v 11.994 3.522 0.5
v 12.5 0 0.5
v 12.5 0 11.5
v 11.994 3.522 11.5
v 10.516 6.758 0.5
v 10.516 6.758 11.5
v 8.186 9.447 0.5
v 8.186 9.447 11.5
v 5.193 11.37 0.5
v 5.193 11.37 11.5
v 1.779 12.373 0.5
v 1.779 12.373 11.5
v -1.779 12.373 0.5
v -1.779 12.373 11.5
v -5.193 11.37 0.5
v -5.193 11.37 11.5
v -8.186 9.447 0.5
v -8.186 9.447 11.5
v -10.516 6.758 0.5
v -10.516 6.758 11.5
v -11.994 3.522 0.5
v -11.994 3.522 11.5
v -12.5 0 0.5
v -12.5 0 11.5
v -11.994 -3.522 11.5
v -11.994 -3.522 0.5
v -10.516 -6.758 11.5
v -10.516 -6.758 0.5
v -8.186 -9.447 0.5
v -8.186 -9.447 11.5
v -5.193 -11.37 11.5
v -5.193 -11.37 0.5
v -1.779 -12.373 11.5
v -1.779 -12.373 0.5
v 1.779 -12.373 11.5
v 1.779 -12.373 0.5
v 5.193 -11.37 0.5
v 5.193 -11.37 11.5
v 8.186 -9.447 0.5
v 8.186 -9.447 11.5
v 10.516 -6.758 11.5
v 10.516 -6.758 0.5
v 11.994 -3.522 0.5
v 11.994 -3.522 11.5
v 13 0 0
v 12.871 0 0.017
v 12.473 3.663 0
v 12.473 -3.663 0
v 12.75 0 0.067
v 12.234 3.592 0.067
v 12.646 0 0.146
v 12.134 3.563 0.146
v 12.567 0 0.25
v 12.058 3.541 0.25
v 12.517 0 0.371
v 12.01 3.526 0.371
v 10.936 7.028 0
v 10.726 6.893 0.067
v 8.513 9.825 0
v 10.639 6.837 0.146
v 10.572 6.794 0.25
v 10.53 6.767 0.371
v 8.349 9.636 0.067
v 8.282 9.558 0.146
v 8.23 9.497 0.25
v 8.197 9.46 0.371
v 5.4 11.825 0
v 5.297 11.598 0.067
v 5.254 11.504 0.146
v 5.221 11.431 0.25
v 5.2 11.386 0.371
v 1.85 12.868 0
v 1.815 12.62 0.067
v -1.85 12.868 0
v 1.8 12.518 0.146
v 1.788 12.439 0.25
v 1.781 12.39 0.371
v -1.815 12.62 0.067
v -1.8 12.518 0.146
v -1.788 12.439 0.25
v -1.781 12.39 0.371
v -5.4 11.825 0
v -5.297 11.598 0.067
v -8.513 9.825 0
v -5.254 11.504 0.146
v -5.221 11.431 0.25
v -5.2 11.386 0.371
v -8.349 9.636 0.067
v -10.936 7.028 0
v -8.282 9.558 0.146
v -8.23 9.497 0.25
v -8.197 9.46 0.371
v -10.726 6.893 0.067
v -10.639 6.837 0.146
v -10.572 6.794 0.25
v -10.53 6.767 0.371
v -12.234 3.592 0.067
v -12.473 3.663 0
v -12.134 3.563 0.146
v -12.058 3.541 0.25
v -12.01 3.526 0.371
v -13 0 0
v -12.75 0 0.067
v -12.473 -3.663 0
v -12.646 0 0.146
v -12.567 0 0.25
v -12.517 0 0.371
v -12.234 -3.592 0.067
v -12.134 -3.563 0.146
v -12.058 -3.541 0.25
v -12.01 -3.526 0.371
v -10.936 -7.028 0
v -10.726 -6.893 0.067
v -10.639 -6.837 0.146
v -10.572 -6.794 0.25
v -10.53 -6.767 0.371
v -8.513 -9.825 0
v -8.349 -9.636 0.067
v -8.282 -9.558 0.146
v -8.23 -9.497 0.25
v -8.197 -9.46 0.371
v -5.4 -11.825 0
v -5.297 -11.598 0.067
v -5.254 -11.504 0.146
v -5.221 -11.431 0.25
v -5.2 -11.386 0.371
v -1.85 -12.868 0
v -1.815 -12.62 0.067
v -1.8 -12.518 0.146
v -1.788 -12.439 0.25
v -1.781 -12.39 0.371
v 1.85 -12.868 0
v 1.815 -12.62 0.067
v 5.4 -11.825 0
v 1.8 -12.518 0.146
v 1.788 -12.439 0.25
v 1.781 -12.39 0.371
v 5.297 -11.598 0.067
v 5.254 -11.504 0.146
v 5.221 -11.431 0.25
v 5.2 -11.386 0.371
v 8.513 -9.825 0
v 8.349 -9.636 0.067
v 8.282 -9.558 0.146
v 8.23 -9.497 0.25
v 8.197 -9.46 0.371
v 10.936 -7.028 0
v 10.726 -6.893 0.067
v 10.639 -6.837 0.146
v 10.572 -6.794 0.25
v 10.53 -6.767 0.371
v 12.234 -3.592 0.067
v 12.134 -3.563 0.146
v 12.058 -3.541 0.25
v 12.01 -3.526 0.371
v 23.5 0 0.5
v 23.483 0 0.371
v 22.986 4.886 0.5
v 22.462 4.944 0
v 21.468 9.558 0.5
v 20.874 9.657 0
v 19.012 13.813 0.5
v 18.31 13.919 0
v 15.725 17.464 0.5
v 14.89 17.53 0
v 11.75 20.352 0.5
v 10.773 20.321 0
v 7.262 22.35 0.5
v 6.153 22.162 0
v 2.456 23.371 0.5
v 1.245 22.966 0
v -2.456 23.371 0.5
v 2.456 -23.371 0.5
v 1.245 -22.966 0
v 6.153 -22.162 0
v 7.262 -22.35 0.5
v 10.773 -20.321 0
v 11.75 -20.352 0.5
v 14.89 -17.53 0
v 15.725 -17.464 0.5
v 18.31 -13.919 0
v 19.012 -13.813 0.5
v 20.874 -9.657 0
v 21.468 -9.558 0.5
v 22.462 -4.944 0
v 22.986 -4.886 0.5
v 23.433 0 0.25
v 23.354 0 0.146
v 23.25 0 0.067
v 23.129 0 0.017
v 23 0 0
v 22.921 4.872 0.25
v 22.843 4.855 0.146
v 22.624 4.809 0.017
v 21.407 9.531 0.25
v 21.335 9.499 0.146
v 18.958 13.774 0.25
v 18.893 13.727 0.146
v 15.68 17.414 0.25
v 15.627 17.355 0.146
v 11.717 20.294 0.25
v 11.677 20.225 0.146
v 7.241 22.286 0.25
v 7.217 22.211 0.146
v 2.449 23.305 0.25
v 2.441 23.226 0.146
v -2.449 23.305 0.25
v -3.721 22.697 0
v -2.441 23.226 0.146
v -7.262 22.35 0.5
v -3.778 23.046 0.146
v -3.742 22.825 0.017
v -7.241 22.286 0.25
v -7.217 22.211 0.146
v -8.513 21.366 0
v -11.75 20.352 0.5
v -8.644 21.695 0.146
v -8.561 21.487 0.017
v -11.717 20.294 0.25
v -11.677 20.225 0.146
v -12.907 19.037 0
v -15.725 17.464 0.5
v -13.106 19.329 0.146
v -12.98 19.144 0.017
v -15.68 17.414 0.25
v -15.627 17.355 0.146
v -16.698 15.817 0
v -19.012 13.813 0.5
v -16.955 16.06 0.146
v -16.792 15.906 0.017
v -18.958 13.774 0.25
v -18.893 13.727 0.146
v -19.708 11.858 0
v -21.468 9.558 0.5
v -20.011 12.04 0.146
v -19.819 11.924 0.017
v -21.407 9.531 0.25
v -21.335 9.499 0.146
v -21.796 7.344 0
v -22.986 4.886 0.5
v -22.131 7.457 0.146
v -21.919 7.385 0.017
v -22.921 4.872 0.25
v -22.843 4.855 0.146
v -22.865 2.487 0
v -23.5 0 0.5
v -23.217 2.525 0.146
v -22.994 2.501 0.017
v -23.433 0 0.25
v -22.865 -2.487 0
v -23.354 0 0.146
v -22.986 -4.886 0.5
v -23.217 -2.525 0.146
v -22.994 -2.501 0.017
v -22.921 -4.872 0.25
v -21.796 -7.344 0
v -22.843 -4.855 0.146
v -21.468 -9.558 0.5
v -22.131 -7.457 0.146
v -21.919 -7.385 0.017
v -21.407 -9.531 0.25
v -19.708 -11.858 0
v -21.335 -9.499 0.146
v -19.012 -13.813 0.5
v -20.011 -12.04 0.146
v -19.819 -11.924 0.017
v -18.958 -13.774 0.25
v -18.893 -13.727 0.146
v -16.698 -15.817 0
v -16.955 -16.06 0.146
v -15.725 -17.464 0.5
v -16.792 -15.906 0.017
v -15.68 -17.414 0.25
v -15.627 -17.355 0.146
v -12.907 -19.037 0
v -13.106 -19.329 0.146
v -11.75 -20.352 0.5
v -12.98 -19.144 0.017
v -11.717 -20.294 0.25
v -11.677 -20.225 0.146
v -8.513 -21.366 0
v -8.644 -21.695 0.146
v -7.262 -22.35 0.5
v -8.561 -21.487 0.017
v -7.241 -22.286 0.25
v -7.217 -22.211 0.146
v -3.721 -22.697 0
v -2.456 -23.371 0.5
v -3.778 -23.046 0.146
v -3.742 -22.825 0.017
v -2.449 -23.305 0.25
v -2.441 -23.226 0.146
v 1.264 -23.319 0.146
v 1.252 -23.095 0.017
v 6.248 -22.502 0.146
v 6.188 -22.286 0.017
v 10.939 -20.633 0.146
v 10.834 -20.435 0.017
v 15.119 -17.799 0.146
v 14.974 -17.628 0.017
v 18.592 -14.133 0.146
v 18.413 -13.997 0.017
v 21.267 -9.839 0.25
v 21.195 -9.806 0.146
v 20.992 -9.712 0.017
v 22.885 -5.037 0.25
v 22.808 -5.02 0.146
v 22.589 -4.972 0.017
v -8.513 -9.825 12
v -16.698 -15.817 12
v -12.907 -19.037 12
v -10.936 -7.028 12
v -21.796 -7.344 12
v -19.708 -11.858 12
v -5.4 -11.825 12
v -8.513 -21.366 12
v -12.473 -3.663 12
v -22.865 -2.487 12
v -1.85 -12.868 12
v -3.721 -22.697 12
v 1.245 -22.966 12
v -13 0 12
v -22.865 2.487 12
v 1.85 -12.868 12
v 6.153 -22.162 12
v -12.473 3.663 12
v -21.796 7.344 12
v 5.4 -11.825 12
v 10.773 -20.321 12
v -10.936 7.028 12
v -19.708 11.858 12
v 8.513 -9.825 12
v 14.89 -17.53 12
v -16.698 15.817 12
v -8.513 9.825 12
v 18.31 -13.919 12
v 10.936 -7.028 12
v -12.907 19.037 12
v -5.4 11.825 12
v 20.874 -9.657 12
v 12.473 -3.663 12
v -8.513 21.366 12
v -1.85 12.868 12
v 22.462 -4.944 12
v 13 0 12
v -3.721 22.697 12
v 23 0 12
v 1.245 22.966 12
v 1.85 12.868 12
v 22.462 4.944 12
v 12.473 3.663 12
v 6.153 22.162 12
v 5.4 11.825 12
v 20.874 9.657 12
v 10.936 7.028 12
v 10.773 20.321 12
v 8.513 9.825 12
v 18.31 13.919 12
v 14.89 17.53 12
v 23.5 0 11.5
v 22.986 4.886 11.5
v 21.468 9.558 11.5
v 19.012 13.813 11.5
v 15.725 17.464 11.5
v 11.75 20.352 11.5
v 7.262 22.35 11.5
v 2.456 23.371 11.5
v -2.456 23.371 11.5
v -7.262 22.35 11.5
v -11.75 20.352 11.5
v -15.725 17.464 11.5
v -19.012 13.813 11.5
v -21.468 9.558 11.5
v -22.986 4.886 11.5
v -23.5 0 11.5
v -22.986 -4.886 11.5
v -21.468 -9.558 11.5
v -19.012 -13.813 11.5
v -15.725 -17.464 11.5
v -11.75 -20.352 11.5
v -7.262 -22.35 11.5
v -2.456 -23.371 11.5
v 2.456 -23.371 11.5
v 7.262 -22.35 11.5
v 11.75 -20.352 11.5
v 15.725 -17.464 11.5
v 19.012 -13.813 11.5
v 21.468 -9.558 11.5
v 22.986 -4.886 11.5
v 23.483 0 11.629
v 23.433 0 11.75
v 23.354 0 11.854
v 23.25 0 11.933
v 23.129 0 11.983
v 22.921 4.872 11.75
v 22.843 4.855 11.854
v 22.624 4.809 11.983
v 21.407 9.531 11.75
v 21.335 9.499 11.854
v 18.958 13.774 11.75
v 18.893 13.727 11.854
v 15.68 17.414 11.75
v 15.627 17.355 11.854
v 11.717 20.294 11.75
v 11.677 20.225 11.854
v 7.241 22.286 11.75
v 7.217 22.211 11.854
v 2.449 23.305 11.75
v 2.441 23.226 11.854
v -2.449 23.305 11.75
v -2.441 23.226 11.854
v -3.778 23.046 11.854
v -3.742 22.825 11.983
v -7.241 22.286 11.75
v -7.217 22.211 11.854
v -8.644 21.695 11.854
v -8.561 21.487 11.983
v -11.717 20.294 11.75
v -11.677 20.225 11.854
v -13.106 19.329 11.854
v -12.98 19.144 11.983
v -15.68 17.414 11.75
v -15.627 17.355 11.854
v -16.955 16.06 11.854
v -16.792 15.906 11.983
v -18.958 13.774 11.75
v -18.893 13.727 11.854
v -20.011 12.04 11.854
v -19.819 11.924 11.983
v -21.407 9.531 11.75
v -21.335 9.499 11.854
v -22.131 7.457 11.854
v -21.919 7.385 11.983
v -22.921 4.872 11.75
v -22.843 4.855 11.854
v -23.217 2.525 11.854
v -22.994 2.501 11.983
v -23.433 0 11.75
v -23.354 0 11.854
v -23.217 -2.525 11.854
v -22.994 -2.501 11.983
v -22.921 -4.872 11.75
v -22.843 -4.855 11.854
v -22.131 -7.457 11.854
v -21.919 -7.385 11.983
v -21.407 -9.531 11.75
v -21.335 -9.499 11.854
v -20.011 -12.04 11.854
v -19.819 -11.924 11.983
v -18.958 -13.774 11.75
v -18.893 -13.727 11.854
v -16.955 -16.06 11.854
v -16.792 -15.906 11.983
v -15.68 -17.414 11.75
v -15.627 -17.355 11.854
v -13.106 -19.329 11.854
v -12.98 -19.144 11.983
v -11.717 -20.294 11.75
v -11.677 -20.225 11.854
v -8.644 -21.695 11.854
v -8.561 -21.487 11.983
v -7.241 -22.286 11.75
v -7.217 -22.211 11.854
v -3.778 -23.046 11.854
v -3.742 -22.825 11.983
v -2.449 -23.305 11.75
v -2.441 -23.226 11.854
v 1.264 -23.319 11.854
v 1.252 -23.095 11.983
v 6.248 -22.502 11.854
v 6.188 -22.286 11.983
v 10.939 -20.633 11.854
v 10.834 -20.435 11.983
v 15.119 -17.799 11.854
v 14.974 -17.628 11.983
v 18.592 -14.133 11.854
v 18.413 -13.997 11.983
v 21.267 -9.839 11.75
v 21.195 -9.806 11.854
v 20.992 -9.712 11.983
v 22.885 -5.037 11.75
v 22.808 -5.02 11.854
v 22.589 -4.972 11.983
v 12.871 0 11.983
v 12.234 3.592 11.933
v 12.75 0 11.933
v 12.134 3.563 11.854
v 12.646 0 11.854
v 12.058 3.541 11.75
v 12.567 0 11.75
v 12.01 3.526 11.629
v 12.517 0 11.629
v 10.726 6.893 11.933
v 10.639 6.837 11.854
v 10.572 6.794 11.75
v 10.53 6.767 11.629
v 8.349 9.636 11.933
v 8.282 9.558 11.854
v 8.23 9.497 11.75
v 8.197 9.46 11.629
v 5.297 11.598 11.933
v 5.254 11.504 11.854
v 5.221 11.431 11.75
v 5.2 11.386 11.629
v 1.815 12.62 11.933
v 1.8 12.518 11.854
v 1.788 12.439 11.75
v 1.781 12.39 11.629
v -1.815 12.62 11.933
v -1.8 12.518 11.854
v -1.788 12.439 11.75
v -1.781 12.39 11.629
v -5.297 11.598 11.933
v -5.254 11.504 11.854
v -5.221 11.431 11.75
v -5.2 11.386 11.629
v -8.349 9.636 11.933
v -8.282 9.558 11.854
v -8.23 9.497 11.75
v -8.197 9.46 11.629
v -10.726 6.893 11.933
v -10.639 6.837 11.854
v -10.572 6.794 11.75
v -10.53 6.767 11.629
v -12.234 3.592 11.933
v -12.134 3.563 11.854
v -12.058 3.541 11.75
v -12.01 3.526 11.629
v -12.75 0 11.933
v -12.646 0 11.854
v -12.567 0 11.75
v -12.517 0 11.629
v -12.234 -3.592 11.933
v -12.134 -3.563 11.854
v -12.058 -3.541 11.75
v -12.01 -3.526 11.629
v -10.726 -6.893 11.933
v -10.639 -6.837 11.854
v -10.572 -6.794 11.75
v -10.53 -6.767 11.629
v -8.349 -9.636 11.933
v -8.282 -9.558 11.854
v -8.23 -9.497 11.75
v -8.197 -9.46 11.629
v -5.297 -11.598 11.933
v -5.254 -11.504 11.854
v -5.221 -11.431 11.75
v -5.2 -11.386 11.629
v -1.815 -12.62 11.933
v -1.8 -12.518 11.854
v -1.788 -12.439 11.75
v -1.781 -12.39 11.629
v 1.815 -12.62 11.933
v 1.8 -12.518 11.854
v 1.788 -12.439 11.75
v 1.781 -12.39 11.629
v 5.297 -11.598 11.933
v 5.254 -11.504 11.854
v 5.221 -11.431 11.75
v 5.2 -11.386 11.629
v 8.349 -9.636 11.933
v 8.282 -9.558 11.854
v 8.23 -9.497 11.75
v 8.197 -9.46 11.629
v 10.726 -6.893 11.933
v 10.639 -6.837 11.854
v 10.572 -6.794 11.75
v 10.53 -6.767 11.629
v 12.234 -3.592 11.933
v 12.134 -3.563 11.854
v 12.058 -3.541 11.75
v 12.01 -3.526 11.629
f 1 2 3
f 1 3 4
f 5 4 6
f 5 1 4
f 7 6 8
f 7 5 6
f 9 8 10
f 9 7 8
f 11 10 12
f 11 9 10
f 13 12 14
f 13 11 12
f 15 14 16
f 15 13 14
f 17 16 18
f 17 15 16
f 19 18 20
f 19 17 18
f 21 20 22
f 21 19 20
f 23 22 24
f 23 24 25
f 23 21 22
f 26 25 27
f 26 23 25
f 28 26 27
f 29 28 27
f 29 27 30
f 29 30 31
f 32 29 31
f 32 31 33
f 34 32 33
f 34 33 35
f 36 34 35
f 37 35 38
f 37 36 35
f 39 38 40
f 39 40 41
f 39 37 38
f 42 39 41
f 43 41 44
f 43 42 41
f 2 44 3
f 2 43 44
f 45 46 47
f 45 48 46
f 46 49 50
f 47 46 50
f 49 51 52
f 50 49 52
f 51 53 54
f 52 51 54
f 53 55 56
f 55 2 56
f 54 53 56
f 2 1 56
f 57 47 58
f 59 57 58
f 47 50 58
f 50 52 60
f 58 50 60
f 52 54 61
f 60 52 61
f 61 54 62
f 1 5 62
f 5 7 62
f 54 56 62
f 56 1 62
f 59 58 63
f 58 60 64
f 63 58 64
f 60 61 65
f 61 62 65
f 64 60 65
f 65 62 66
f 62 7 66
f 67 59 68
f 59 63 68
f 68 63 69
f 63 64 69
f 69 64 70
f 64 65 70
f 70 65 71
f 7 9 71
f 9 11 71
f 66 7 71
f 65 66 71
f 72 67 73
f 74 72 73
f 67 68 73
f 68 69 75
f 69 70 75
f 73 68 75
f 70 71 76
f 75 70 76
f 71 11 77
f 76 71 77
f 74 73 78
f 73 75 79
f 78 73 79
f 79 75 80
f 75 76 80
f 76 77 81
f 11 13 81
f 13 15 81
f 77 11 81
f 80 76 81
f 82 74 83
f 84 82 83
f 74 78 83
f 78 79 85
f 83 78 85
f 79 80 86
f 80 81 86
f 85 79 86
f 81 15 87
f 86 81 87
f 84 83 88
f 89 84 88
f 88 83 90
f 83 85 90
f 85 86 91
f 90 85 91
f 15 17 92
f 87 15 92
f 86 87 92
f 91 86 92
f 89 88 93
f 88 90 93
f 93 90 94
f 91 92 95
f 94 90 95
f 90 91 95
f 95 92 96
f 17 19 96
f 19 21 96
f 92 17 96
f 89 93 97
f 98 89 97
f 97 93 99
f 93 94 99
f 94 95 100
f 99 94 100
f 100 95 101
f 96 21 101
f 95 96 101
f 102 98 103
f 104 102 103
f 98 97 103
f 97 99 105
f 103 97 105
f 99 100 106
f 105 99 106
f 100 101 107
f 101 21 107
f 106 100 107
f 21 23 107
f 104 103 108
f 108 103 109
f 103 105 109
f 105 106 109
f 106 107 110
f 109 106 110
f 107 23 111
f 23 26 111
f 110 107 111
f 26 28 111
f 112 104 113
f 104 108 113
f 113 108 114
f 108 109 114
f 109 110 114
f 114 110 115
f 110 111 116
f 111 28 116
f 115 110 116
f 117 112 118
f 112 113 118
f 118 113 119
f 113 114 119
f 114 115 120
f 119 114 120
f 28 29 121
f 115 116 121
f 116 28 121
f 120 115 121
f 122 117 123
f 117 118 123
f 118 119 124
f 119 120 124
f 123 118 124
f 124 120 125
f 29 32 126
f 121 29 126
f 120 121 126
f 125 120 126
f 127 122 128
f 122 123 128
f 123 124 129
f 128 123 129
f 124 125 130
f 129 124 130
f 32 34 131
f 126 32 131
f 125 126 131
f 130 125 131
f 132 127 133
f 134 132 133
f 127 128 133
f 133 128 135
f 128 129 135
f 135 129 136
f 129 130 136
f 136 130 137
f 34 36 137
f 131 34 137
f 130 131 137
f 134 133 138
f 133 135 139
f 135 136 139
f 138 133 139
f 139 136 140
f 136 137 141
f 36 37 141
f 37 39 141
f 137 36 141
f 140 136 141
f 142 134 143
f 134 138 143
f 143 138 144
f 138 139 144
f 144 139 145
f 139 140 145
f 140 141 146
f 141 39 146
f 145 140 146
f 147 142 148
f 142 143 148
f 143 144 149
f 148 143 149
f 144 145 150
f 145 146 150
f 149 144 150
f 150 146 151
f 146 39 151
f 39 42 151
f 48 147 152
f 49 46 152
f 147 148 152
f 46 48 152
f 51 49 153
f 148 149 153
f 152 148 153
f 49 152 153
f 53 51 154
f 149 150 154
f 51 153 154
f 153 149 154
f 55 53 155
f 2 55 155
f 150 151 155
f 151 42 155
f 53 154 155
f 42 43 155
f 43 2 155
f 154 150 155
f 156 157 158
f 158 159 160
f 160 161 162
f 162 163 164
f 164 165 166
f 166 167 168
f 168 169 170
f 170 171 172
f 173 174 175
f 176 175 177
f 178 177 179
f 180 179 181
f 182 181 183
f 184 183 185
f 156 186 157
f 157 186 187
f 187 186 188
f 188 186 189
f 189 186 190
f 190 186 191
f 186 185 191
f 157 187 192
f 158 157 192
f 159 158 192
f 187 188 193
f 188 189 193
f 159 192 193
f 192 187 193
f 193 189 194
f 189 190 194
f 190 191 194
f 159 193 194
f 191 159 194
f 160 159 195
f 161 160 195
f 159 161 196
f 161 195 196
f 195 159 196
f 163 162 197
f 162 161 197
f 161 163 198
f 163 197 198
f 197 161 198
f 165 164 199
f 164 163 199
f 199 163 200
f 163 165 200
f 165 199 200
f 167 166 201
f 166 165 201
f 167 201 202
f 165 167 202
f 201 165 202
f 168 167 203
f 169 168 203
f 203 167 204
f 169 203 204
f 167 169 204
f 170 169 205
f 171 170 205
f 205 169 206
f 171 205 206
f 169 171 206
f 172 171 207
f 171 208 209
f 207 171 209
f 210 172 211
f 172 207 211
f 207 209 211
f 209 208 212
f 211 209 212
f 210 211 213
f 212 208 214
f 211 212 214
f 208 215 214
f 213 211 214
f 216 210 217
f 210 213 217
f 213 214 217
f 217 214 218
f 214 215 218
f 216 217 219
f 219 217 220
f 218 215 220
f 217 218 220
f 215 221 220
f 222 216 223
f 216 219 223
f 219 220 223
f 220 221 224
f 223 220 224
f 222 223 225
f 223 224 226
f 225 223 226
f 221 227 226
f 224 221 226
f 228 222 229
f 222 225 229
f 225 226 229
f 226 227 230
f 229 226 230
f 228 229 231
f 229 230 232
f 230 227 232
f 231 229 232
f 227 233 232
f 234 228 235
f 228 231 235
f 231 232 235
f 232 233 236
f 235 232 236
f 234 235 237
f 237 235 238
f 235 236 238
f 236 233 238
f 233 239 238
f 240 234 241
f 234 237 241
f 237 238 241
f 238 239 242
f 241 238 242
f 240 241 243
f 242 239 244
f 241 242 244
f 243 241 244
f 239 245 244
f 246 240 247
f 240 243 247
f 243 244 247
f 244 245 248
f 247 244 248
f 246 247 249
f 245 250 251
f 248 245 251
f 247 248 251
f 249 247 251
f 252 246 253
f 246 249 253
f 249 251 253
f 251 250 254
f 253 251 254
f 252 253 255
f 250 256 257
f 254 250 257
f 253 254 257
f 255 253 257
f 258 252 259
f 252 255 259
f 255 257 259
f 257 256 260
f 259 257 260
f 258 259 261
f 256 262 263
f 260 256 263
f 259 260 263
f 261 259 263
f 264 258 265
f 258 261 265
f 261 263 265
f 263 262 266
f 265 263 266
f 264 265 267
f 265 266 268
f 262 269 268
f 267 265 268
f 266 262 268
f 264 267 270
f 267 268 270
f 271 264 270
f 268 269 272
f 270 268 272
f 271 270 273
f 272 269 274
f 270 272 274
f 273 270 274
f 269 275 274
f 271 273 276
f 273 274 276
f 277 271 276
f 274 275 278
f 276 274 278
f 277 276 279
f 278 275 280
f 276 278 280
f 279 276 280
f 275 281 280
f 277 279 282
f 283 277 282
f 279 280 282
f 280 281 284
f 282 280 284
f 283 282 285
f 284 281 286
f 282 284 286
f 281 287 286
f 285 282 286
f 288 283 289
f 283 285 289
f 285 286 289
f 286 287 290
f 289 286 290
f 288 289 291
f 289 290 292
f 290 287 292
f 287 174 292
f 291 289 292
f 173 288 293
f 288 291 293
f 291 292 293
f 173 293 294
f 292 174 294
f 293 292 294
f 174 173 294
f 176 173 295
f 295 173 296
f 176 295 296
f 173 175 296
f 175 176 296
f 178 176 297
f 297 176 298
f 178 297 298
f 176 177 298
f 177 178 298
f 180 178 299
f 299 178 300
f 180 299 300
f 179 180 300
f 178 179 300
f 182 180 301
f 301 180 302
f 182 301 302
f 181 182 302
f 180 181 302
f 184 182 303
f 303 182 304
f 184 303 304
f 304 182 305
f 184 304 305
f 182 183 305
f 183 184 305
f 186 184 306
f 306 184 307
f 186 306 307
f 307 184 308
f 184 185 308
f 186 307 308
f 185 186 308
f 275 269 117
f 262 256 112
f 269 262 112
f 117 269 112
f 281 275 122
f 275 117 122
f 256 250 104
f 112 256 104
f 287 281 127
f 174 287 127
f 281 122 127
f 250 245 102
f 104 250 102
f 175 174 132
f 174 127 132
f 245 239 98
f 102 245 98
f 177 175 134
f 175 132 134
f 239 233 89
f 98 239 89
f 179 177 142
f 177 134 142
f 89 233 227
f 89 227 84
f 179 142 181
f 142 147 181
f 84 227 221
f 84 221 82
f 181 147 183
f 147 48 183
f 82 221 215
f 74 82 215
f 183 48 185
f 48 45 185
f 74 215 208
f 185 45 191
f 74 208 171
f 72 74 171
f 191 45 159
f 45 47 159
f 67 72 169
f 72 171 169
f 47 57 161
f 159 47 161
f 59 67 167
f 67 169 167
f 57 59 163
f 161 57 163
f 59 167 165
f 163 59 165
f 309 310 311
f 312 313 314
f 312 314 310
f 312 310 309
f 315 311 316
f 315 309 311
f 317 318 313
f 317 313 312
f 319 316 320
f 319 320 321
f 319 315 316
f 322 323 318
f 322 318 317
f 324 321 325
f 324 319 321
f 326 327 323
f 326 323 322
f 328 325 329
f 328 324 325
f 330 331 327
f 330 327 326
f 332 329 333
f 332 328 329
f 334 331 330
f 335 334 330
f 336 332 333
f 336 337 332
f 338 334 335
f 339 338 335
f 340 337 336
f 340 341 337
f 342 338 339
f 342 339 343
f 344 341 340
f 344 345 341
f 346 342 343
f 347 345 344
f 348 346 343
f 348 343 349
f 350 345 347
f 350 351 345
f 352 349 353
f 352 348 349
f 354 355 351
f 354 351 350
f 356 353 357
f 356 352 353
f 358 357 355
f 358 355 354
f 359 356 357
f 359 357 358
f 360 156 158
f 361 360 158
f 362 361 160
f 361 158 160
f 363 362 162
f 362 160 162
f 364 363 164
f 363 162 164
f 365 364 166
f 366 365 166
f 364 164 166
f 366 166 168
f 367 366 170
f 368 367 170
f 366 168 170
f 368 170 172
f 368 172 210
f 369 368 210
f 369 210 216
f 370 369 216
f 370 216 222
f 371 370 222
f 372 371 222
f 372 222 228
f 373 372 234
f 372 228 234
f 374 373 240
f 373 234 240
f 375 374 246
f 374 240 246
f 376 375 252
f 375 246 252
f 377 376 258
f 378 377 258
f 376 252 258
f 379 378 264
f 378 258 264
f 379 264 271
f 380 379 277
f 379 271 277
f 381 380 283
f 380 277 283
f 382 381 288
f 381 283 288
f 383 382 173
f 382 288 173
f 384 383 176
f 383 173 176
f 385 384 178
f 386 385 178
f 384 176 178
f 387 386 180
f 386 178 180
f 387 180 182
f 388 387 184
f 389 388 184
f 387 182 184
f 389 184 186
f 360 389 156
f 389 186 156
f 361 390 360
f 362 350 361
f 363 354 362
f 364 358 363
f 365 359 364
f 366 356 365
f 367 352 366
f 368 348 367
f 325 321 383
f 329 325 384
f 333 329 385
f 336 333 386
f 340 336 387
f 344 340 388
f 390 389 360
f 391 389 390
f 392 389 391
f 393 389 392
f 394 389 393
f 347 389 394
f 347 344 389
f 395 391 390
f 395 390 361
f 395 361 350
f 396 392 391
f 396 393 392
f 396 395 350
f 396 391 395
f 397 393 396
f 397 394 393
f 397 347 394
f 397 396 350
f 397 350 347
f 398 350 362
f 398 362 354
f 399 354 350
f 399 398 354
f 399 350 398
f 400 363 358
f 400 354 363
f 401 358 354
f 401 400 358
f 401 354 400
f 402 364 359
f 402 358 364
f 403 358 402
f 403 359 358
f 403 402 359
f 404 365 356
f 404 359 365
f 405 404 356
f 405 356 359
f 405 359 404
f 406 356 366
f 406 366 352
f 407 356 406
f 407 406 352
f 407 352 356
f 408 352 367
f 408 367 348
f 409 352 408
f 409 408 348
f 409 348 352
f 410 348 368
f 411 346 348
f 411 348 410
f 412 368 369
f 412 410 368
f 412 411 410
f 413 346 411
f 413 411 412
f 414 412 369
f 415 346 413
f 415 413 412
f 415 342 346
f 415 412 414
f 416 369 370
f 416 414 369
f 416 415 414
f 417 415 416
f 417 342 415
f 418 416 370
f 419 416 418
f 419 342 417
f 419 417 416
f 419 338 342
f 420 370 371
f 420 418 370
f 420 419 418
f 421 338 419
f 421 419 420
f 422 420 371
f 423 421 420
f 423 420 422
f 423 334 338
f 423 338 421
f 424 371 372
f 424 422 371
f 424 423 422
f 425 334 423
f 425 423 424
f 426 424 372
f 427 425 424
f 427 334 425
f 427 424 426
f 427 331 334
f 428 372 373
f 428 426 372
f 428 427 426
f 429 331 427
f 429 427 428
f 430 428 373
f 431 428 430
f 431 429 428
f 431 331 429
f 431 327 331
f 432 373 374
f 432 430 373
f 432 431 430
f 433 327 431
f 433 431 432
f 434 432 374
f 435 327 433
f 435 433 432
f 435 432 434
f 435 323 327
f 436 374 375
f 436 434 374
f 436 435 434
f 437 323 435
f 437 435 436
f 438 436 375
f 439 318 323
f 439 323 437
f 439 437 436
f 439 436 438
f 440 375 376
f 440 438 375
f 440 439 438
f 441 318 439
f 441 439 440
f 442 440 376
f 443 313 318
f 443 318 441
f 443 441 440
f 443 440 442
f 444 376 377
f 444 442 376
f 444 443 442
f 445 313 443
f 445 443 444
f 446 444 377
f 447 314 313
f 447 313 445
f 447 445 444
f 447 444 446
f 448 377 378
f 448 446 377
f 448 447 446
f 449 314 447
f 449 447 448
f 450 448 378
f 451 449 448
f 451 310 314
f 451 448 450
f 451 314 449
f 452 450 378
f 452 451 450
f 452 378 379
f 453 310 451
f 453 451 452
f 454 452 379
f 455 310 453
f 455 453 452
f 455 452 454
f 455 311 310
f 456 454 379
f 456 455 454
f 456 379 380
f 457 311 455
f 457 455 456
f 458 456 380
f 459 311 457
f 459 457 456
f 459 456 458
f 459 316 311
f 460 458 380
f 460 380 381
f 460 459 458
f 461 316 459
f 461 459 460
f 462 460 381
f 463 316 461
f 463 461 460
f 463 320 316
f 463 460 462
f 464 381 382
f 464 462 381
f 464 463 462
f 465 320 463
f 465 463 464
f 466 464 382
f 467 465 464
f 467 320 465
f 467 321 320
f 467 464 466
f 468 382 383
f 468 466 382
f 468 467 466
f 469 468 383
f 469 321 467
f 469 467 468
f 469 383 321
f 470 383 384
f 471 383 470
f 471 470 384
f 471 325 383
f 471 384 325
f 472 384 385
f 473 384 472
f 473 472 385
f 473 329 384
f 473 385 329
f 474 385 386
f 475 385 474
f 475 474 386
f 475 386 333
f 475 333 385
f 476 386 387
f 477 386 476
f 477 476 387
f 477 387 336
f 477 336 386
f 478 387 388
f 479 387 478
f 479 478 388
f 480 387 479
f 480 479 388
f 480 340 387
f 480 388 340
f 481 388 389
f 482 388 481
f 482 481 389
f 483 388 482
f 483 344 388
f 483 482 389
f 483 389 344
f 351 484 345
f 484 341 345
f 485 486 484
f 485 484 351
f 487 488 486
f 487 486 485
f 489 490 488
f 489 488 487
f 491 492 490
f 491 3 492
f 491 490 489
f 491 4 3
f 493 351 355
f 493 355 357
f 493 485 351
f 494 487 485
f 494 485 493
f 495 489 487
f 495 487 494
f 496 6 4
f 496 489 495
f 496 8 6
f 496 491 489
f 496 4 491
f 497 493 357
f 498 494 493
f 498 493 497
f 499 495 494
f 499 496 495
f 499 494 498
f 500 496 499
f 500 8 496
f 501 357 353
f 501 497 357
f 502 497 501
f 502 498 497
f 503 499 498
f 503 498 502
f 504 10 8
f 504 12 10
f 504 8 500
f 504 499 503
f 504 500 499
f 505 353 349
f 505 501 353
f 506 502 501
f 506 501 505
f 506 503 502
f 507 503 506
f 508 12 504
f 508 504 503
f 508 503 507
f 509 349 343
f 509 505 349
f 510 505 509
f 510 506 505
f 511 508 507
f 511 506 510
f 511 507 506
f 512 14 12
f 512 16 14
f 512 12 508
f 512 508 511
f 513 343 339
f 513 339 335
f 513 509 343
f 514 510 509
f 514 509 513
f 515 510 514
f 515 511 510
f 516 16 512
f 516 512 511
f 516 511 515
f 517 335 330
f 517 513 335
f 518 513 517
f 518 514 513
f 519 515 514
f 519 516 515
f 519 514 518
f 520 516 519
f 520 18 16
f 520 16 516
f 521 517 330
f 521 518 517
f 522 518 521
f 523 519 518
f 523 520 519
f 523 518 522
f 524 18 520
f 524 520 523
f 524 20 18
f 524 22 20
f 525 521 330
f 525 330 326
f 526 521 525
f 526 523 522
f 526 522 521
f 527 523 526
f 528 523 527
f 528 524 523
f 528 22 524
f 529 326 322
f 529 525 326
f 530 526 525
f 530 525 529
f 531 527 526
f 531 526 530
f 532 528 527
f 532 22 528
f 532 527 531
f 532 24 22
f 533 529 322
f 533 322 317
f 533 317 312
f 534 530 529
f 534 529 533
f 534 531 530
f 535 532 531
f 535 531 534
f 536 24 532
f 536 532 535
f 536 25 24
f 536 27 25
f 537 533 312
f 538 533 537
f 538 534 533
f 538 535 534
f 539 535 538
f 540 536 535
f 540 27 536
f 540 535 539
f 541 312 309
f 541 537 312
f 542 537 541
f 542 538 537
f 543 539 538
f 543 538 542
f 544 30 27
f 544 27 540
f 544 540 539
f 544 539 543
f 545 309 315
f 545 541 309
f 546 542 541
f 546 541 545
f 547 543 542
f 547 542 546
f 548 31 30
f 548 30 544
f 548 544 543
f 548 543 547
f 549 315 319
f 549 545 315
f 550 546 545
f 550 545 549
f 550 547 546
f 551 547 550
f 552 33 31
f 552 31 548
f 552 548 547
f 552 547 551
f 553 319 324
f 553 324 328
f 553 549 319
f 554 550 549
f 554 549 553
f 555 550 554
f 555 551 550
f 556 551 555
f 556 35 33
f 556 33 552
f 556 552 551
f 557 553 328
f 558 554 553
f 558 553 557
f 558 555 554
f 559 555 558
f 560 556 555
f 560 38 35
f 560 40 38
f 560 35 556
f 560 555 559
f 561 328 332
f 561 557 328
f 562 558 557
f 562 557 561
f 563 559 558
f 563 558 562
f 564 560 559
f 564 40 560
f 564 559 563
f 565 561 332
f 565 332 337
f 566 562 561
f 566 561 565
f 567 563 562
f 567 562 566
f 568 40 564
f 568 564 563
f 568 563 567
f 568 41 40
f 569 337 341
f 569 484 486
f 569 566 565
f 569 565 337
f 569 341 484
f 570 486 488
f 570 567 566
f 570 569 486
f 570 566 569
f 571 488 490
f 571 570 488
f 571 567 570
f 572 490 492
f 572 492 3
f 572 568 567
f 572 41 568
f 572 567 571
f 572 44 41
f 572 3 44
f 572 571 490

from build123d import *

# Parameters (mm, degrees)
SKETCH1_R           = 23.5
SKETCH1_R_2         = 12.5
BOSS_EXTRUDE1_DEPTH = 12
FILLET1_R           = 0.5
FILLET2_R           = 0.5


with BuildPart() as part:
    # Sketch1 → Boss-Extrude1 (new body)
    with BuildSketch(Plane.XY):
        Circle(SKETCH1_R)
        Circle(SKETCH1_R_2, mode=Mode.SUBTRACT)
    extrude(amount=BOSS_EXTRUDE1_DEPTH)

    # Fillet1
    fillet1_edges = [part.edges().sort_by_distance(p)[0] for p in [
        (-23.5, 0, 0),
        (-23.5, 0, 12),
    ]]
    fillet(fillet1_edges, radius=FILLET1_R)

    # Fillet2
    fillet2_edges = [part.edges().sort_by_distance(p)[0] for p in [
        (-12.5, 0, 0),
        (-12.5, 0, 12),
    ]]
    fillet(fillet2_edges, radius=FILLET2_R)


solid = part.part
